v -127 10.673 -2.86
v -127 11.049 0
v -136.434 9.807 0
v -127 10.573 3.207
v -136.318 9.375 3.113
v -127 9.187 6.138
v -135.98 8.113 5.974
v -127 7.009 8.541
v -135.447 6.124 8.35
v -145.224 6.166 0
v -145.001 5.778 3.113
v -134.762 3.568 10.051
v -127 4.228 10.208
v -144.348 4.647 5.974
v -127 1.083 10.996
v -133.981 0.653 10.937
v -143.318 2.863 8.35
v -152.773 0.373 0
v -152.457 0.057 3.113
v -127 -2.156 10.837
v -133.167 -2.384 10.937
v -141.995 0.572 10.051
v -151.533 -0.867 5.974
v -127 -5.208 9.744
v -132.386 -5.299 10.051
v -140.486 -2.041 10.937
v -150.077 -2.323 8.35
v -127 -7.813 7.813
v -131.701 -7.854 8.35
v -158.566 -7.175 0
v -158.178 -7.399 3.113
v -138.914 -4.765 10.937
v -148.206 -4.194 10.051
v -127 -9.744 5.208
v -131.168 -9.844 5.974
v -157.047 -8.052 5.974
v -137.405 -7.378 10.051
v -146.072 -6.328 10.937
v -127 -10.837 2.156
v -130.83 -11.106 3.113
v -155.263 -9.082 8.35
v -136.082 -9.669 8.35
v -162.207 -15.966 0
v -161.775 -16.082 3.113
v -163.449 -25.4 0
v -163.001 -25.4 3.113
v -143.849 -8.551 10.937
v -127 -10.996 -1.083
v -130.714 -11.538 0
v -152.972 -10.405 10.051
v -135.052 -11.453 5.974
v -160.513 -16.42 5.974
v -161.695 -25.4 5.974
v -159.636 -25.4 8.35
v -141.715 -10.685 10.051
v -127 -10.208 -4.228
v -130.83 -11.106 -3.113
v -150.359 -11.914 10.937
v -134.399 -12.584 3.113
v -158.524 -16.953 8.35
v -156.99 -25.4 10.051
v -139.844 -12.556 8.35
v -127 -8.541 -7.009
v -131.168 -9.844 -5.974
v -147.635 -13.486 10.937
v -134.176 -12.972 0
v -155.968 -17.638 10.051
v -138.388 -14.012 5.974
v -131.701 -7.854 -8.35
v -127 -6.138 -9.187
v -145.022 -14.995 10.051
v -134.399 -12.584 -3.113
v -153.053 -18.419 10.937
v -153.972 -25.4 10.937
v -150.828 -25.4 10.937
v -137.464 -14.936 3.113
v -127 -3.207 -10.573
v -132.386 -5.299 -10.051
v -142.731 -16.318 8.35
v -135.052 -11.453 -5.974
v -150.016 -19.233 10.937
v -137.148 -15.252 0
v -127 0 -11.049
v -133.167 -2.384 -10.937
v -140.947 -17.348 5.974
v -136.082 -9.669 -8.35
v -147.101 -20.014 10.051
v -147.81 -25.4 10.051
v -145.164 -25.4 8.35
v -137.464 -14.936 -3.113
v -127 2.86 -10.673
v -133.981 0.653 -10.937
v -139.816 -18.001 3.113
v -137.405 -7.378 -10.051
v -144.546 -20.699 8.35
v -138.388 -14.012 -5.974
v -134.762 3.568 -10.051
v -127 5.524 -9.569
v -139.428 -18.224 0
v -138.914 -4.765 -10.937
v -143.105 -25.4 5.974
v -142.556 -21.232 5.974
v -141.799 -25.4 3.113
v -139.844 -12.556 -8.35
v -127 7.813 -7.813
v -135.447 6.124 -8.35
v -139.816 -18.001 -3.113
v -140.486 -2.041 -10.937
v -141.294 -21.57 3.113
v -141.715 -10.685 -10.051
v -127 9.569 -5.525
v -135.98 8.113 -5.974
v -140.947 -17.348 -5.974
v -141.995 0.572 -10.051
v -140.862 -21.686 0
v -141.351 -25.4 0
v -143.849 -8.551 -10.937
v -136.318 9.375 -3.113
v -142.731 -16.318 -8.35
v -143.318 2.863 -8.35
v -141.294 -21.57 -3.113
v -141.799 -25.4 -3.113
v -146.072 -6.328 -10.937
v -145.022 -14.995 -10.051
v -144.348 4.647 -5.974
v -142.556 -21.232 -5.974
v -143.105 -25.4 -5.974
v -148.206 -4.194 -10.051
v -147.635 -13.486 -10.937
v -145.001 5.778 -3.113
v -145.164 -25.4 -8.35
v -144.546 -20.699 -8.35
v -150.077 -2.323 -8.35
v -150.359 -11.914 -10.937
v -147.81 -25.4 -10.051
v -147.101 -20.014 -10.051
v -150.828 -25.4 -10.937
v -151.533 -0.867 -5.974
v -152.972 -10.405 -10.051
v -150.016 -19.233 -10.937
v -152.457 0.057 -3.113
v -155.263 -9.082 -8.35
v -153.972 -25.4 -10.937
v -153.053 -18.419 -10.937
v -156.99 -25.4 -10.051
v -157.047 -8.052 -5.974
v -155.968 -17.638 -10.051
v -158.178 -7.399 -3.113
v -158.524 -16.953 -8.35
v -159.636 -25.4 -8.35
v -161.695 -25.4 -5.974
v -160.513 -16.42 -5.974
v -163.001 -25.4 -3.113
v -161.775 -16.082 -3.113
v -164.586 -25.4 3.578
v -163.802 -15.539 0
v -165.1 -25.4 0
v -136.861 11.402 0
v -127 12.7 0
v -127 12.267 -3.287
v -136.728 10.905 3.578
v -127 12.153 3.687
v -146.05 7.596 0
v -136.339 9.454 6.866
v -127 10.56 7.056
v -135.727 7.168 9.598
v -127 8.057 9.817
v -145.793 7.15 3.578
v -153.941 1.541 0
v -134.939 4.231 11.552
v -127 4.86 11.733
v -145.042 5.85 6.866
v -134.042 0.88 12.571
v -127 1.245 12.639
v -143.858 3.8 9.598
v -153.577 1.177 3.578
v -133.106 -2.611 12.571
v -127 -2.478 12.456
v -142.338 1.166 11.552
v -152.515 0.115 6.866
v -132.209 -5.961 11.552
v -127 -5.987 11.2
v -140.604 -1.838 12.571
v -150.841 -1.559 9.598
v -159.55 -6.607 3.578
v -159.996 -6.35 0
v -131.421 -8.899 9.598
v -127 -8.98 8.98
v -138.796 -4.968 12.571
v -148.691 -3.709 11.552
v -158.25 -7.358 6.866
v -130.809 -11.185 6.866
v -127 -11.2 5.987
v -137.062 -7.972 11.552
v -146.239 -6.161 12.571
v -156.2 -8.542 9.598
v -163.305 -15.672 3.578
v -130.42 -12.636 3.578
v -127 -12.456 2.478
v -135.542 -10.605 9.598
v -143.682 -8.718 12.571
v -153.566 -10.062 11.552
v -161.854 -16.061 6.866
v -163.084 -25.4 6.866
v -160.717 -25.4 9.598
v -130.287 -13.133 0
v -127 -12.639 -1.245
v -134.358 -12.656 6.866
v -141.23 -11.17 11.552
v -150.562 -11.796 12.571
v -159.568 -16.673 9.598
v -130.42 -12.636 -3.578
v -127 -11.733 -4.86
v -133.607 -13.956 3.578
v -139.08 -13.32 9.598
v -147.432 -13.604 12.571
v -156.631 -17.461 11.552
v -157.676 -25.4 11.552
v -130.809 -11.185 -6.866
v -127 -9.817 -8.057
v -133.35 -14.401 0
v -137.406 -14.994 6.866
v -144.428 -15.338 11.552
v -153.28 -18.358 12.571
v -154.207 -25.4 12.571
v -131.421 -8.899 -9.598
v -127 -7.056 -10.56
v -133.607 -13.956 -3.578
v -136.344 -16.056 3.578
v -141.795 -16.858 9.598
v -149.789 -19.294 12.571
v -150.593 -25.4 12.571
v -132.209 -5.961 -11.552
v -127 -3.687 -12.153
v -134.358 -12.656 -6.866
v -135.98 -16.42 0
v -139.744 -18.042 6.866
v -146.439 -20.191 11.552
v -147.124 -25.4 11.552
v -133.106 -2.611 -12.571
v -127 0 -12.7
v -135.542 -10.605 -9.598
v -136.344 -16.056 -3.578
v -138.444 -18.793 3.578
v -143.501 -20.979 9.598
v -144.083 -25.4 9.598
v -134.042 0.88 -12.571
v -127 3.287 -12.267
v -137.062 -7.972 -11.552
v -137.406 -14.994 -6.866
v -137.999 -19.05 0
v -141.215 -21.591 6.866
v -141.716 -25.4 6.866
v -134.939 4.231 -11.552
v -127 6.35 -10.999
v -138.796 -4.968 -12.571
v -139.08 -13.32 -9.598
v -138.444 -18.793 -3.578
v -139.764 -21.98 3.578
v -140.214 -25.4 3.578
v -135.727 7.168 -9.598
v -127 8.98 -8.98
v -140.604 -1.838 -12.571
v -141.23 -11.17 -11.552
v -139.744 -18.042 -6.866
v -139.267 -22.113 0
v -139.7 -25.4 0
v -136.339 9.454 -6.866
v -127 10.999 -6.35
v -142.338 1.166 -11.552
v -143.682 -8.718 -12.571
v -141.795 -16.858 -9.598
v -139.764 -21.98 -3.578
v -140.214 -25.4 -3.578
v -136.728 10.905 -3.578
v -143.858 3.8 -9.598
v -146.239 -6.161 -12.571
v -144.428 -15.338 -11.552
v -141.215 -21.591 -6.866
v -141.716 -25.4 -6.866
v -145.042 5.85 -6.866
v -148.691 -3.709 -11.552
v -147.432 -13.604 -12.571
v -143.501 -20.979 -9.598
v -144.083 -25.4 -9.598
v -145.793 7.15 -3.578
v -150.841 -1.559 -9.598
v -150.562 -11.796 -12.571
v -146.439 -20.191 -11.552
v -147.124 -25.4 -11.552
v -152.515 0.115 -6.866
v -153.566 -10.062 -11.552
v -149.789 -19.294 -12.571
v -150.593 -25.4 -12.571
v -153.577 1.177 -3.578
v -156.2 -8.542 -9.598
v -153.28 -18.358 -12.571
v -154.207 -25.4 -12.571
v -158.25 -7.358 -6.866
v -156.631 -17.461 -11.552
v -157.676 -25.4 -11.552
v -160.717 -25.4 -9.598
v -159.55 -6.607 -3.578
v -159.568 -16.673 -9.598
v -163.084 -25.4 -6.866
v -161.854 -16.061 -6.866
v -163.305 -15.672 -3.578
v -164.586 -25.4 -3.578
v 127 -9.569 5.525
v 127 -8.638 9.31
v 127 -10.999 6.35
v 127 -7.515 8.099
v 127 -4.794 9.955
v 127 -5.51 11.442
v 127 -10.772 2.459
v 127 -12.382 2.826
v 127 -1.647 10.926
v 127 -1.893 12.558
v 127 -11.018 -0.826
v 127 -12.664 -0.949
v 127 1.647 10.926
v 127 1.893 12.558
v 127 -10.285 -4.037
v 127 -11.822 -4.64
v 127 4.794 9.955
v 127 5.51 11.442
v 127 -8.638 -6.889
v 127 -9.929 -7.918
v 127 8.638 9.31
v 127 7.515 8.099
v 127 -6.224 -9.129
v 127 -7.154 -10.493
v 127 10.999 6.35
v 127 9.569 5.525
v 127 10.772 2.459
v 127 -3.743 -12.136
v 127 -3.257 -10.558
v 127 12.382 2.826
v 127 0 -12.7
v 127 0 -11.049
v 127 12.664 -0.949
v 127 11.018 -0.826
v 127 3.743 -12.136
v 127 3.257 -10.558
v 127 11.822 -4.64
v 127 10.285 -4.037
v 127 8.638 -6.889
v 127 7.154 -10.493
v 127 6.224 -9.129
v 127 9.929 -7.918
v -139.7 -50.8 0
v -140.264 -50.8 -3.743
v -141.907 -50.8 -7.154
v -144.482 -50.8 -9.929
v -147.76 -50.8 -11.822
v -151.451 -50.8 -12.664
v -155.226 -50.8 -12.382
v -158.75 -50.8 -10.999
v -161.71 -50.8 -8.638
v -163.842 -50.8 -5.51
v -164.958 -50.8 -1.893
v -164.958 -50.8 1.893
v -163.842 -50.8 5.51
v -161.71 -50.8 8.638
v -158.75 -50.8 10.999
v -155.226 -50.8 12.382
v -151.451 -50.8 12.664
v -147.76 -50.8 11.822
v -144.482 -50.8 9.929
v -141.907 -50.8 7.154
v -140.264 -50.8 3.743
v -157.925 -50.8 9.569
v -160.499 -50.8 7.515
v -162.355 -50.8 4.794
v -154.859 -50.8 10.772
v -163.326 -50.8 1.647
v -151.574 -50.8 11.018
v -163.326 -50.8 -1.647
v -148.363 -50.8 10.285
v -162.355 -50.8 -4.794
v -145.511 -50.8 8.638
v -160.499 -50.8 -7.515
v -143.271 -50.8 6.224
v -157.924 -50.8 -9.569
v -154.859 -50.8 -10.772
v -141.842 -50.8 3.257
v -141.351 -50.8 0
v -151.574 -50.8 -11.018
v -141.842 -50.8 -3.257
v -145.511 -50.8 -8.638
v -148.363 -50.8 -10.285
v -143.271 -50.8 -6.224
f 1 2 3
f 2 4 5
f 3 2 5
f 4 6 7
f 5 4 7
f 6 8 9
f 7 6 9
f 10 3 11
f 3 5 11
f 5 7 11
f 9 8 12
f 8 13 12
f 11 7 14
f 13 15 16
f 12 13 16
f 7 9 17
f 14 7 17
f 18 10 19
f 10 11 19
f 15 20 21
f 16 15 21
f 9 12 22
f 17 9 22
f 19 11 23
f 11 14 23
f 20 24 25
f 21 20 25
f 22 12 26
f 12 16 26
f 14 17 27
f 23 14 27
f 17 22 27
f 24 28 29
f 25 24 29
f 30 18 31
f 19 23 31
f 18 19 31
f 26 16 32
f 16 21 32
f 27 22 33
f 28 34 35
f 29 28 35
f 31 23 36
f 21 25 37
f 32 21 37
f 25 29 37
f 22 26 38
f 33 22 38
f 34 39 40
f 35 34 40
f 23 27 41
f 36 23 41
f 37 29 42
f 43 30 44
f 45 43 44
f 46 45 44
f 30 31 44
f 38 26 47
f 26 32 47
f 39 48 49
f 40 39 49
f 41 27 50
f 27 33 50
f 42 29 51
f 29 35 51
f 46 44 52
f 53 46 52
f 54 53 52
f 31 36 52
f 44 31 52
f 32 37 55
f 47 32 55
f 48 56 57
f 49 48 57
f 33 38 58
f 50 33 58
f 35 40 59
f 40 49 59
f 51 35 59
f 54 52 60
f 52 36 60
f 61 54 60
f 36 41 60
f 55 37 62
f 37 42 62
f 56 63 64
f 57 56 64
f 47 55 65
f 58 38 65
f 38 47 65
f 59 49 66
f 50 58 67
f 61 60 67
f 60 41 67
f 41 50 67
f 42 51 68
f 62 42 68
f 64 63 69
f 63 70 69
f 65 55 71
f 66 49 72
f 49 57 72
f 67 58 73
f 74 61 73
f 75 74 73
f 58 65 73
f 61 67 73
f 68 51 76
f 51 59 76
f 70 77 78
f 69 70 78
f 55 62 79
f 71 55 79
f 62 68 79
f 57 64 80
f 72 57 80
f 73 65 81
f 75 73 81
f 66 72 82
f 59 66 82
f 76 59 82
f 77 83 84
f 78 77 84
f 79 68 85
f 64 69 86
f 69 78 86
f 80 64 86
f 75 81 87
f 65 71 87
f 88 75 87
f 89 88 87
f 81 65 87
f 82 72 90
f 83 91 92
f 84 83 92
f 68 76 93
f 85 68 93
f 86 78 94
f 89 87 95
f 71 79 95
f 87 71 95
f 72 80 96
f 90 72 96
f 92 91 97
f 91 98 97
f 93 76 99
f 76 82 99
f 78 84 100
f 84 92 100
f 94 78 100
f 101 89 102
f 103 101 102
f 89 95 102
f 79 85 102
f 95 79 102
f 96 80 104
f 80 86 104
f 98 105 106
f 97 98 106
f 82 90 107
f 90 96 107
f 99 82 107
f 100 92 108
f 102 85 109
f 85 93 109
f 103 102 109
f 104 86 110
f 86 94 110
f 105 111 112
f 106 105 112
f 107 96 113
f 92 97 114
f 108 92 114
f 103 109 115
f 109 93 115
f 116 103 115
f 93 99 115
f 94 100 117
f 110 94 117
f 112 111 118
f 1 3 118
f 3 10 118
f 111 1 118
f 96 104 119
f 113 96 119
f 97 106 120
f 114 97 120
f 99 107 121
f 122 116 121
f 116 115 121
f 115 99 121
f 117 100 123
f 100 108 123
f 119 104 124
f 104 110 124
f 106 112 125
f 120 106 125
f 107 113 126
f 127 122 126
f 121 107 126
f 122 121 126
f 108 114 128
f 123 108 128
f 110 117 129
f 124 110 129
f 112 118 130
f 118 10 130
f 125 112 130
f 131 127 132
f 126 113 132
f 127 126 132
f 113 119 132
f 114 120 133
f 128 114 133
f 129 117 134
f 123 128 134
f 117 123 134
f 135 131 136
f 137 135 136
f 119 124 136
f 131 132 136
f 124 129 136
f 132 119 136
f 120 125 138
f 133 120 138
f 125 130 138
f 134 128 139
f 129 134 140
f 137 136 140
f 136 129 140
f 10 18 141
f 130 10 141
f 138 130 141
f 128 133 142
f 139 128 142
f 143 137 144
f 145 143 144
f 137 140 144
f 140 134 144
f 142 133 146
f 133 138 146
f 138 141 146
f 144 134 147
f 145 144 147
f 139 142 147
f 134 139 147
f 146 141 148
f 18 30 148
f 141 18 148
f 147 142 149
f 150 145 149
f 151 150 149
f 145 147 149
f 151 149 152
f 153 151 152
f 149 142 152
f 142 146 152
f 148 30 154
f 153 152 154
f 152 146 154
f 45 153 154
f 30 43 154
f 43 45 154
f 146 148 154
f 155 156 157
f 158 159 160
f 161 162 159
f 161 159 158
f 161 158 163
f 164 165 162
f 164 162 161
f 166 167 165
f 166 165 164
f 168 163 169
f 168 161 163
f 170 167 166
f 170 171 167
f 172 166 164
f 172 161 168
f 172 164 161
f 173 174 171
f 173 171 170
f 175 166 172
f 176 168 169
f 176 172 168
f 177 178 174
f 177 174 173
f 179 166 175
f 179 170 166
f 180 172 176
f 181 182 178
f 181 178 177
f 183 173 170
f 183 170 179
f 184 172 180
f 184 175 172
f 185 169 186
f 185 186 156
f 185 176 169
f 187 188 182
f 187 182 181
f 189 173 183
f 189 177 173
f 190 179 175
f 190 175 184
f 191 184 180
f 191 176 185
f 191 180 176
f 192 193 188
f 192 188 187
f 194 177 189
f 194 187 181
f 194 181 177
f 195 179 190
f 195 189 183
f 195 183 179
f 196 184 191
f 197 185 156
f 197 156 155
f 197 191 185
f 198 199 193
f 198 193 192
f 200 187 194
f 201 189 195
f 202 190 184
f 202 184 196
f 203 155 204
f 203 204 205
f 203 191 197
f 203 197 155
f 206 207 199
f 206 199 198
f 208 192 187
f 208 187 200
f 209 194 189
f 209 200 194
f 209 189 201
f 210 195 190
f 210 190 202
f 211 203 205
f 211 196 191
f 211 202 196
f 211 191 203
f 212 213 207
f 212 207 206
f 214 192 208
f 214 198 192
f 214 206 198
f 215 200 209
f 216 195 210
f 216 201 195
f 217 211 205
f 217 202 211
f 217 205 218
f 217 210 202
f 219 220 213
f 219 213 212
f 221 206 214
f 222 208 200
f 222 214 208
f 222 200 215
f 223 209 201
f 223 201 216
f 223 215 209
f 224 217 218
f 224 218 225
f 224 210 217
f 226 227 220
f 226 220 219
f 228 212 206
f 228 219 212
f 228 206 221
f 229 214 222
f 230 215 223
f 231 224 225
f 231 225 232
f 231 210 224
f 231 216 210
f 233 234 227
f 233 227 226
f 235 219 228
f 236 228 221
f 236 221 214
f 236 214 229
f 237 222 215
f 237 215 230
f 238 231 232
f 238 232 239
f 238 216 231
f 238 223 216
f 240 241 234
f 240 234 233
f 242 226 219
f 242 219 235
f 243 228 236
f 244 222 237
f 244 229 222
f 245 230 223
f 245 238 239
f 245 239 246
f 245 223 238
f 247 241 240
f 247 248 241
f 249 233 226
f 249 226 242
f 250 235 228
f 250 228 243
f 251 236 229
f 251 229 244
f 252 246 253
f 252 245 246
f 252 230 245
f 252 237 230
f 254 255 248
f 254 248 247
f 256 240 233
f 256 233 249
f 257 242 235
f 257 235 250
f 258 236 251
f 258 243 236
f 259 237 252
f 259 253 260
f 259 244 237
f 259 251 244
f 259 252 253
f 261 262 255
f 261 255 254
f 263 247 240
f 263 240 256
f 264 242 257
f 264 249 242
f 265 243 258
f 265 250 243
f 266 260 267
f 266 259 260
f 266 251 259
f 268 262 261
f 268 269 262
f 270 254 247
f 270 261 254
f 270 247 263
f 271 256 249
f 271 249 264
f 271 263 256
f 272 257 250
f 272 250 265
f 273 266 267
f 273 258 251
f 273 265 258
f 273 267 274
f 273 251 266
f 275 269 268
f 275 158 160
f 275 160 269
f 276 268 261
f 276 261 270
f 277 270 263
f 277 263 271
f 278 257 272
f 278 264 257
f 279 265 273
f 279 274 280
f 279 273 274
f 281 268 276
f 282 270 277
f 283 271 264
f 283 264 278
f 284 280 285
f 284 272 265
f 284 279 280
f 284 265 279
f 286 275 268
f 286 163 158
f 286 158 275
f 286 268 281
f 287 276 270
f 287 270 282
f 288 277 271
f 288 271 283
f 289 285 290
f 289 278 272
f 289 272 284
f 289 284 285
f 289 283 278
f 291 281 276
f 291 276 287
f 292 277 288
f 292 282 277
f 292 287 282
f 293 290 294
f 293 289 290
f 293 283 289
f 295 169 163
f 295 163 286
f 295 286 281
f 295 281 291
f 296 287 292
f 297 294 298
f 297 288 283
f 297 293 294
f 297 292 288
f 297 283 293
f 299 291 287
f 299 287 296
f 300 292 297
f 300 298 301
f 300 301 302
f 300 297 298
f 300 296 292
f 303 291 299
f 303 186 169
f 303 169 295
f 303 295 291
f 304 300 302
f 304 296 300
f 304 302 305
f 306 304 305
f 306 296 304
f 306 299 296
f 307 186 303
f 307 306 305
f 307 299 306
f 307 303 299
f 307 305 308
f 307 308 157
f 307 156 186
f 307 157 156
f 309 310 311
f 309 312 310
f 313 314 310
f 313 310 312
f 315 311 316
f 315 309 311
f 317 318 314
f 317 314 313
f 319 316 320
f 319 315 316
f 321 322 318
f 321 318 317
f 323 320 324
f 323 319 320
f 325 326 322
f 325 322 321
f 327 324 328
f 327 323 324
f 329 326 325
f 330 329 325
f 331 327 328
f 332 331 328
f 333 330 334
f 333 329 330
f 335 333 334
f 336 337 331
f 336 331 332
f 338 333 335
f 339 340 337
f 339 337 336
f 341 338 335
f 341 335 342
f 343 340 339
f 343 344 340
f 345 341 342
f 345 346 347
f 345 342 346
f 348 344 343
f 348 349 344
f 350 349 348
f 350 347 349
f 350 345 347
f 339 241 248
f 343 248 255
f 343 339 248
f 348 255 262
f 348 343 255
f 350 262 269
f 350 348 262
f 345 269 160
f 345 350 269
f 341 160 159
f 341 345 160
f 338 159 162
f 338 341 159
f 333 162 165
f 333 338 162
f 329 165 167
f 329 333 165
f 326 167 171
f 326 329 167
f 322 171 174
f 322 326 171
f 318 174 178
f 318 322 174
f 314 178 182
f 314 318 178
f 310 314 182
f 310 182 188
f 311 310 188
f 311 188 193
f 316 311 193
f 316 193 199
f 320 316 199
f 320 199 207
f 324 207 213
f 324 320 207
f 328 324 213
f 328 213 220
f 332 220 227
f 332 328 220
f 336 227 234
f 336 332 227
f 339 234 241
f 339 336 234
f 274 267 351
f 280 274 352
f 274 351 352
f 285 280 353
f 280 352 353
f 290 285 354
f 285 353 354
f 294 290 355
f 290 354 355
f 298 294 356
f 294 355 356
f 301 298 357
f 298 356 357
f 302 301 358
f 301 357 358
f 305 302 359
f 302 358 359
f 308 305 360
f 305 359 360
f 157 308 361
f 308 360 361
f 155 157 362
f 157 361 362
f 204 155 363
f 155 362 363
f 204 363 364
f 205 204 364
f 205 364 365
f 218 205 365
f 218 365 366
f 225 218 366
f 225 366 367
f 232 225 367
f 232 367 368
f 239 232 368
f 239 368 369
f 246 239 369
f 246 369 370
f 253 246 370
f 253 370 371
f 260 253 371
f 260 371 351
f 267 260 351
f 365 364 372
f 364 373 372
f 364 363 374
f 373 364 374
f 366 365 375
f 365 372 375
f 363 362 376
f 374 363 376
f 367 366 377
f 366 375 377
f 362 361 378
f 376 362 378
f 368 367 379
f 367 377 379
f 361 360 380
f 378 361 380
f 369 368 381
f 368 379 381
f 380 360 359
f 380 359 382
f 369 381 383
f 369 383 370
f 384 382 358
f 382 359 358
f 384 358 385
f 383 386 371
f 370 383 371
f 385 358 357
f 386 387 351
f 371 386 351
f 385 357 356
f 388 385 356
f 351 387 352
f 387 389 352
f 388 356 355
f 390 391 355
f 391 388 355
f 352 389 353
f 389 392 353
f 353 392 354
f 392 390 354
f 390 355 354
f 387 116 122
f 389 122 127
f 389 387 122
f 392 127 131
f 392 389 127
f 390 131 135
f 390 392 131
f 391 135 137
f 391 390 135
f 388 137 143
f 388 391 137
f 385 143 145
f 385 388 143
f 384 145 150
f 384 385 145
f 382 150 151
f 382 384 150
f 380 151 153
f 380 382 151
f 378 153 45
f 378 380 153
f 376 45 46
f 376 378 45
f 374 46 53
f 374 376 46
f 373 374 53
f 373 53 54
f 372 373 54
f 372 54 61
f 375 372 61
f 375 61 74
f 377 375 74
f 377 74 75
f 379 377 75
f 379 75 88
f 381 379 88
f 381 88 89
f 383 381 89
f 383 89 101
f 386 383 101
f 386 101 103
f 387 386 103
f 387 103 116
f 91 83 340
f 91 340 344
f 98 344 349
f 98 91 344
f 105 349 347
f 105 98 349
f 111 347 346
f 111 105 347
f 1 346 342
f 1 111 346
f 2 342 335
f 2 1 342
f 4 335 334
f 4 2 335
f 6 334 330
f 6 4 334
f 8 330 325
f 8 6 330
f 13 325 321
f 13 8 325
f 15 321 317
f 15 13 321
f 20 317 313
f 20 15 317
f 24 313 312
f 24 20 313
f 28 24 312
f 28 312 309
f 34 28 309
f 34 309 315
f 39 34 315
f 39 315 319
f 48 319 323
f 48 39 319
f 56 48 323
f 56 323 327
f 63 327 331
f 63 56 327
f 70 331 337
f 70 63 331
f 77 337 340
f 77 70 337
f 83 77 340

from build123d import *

# Parameters (mm, degrees)
SKETCH3_R            = 12.7
SKETCH3_R_2          = 11.049
BOSS_EXTRUDE1_DEPTH  = 127
SWEEP1_START         = -50.8
SWEEP1_OUTLINE_R     = 12.7
SWEEP1_OUTLINE_R_2   = 11.049
SWEEP1_DEPTH         = 25.4
SWEEP1_2_OUTLINE_R   = 12.7
SWEEP1_2_OUTLINE_R_2 = 11.049
SWEEP1_2_ANGLE       = 90


with BuildPart() as part:
    # Sketch3 → Boss-Extrude1 (new, symmetric)
    with BuildSketch(Plane(origin=(0, 0, 0), x_dir=(0, 0, -1), z_dir=(1, 0, 0))):
        Circle(SKETCH3_R)
        Circle(SKETCH3_R_2, mode=Mode.SUBTRACT)
    extrude(amount=BOSS_EXTRUDE1_DEPTH, both=True)



with BuildPart() as body_2:
    # Sweep1: read off the stored shape, not the designer's step
    # Sweep1 outline → Sweep1 (new body)
    with BuildSketch(Plane(origin=(0, 0, 0), x_dir=(1, 0, 0), z_dir=(0, 1, 0)).offset(SWEEP1_START)):
        with Locations((-152.4, 0)):
            Circle(SWEEP1_OUTLINE_R)
        with Locations((-152.4, 0)):
            Circle(SWEEP1_OUTLINE_R_2, mode=Mode.SUBTRACT)
    extrude(amount=SWEEP1_DEPTH)


with BuildPart() as part_1:
    add(part.part)

    add(body_2.part)  # Sweep1 2 merges body 2
    # Sweep1 2 outline → Sweep1 2 (revolve)
    with BuildSketch(Plane(origin=(-127, -25.4, 0), x_dir=(0, 1, 0), z_dir=(1, 0, 0))):
        with Locations((25.4, 0)):
            Circle(SWEEP1_2_OUTLINE_R)
        with Locations((25.4, 0)):
            Circle(SWEEP1_2_OUTLINE_R_2, mode=Mode.SUBTRACT)
    revolve(axis=Axis((-127, -25.4, 0), (0, 0, 1)), revolution_arc=SWEEP1_2_ANGLE)


solid = part_1.part
